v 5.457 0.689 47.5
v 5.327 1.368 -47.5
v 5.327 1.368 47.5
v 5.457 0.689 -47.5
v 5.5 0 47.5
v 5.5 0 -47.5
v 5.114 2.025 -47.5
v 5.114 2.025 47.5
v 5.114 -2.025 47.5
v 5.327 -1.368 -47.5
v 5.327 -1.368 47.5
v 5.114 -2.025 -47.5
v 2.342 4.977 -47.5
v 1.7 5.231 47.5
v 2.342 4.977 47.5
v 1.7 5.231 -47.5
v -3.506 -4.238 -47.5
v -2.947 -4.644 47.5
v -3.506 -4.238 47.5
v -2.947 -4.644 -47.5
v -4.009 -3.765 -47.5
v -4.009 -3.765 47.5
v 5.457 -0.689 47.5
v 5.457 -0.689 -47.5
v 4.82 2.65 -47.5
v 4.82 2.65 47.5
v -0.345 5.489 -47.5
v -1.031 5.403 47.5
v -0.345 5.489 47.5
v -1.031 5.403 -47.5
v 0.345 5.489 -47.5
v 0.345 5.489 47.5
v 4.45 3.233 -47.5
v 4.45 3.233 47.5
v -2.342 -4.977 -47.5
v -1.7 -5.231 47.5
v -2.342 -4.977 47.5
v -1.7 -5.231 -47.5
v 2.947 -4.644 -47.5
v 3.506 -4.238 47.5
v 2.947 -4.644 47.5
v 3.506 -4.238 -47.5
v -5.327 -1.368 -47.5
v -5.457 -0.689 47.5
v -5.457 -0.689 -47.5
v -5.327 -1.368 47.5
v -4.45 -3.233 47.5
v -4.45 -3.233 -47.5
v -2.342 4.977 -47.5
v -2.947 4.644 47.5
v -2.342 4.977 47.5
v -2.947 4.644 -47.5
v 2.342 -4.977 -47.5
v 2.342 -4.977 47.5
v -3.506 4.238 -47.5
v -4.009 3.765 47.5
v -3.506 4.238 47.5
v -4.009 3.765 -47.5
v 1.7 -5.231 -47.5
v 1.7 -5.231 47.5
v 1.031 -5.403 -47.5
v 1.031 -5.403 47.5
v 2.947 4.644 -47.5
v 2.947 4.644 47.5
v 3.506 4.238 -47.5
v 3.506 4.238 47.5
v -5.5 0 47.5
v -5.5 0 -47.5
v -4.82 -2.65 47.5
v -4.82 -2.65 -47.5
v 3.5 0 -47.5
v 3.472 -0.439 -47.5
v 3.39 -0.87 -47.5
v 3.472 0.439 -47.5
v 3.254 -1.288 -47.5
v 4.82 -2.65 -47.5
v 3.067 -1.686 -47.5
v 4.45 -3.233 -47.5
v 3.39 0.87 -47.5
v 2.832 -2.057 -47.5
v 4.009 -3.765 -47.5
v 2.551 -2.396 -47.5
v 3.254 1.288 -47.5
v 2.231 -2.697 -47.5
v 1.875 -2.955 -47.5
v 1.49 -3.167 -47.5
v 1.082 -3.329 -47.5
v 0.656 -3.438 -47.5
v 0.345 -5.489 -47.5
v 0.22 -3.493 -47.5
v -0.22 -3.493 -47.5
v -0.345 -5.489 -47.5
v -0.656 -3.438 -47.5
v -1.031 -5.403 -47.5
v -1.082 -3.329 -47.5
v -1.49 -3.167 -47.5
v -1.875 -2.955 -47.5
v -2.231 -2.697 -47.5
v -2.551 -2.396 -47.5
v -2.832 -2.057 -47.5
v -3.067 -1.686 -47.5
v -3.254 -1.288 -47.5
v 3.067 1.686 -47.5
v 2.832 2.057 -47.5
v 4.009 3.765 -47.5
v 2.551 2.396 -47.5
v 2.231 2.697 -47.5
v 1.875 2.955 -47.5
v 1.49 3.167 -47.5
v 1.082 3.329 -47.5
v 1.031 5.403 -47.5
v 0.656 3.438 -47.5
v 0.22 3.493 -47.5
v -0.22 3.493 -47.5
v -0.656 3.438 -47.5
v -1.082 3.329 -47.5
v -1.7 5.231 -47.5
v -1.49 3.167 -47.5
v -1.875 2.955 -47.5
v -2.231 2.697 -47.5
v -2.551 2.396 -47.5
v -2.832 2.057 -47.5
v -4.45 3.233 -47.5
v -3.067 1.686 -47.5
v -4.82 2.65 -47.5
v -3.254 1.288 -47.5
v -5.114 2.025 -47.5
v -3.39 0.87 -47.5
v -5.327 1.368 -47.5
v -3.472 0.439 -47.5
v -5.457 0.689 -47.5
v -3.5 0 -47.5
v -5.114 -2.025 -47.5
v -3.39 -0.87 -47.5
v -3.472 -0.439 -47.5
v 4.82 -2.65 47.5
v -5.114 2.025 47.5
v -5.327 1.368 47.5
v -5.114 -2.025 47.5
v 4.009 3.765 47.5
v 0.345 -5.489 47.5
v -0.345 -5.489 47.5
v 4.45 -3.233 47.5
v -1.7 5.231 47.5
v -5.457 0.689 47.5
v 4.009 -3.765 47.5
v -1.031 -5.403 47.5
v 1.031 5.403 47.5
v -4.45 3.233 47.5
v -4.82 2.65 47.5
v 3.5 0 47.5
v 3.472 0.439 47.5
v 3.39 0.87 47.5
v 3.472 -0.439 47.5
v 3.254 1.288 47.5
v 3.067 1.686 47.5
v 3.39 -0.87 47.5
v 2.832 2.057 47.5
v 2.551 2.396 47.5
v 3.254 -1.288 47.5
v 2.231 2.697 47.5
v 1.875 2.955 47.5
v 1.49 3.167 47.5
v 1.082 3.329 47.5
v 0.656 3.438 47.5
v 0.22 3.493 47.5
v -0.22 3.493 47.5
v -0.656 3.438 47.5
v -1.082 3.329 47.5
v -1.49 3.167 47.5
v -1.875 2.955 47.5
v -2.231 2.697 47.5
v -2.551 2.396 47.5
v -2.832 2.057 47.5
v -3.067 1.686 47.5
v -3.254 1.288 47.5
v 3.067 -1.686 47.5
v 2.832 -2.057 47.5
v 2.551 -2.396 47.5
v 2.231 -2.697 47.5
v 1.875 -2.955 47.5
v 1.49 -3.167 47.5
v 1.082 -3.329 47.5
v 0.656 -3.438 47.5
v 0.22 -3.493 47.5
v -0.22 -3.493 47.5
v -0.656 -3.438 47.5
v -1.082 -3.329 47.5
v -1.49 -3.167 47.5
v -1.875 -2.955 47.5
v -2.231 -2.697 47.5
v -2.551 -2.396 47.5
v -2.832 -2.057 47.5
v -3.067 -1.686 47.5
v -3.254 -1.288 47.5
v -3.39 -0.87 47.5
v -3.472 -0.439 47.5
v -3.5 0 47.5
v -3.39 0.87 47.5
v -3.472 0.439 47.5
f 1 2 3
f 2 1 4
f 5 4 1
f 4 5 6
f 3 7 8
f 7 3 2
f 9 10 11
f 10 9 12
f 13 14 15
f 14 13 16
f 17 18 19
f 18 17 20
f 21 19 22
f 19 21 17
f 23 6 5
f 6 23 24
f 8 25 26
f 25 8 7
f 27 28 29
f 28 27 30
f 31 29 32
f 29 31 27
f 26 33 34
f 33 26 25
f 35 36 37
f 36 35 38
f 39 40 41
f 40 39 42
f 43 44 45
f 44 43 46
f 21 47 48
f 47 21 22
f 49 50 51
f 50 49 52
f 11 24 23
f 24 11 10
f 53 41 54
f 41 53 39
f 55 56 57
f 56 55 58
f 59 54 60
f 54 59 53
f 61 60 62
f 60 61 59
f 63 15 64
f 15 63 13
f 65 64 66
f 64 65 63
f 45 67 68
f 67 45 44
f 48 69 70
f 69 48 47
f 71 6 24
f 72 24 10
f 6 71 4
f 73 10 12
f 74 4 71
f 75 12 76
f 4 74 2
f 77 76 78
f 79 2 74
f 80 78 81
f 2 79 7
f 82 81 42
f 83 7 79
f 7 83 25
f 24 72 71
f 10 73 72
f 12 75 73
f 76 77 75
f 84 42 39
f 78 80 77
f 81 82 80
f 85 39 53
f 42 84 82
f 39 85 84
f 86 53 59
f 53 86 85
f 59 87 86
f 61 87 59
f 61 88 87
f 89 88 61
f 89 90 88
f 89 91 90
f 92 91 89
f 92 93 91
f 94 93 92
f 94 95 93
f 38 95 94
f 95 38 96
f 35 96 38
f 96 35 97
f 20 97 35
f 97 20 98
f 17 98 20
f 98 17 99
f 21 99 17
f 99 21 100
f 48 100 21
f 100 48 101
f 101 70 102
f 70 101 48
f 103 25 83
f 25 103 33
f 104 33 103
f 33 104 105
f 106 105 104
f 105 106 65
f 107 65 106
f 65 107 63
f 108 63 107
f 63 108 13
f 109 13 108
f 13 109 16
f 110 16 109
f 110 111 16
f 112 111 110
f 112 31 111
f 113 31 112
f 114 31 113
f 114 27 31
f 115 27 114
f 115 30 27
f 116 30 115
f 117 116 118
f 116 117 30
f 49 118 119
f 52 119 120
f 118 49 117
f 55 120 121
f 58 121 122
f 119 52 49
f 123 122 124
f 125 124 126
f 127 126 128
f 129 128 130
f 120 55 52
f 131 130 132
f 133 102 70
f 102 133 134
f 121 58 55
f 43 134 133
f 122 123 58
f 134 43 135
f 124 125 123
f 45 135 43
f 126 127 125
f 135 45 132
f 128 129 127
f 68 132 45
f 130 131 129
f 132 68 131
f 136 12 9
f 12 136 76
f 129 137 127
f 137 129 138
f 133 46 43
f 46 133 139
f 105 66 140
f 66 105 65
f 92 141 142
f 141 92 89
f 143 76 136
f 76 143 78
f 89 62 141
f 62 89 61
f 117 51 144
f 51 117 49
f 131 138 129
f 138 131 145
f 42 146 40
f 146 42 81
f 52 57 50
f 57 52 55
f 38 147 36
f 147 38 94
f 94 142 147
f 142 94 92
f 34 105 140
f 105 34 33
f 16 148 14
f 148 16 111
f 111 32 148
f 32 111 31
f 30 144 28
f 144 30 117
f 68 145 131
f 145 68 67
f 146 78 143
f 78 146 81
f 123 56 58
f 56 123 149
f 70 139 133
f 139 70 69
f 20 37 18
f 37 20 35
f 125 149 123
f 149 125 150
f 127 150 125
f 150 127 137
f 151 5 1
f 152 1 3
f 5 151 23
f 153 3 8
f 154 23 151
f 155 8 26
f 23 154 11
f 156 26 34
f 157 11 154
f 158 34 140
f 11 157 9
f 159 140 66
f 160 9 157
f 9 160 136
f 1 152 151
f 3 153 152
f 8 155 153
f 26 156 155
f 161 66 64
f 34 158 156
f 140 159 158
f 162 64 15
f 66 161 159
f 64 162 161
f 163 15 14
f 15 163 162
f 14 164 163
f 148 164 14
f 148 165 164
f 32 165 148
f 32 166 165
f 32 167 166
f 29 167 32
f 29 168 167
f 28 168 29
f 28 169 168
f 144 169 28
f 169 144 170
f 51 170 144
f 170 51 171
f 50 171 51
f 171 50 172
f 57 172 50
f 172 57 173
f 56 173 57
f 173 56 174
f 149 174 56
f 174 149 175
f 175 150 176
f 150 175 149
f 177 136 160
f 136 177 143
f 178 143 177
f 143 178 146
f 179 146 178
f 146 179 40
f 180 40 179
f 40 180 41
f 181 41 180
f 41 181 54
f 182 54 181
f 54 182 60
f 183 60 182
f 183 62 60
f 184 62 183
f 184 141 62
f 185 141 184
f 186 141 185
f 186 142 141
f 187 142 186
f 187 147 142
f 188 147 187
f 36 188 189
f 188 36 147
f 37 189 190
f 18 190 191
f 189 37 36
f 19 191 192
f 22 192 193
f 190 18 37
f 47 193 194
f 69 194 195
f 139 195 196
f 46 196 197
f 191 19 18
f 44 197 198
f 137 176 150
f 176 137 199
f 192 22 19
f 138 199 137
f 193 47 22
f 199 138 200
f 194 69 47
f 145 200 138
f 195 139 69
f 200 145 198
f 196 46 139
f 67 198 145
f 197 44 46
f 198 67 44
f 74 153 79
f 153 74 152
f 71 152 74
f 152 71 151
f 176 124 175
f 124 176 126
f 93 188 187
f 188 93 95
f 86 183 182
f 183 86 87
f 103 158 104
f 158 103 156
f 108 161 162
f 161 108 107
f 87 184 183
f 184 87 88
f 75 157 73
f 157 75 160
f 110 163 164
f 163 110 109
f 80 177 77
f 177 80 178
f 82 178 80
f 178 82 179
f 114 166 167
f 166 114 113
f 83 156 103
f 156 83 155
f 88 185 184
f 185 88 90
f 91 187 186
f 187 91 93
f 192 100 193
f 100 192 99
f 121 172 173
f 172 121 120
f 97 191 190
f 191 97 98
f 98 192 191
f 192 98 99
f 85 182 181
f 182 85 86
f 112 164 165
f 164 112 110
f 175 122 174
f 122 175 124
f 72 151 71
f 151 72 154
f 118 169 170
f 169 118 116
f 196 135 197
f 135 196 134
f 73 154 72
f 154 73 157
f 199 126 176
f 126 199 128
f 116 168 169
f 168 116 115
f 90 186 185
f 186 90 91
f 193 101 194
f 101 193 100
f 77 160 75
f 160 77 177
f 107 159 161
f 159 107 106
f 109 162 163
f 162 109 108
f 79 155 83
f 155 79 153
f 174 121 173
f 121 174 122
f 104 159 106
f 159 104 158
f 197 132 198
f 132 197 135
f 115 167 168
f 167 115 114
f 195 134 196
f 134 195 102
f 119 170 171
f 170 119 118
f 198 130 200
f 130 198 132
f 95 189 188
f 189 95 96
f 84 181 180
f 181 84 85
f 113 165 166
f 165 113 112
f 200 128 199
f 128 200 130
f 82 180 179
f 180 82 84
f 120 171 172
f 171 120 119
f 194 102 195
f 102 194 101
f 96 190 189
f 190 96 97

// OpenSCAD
$fn = 50;


difference() {
	union() {
		translate(v = [0, 0, -47.5000000000]) {
			cylinder(h = 95, r = 5.5000000000);
		}
	}
	union() {
		translate(v = [0, 0, -100.0000000000]) {
			cylinder(h = 200, r = 3.5000000000);
		}
	}
}
